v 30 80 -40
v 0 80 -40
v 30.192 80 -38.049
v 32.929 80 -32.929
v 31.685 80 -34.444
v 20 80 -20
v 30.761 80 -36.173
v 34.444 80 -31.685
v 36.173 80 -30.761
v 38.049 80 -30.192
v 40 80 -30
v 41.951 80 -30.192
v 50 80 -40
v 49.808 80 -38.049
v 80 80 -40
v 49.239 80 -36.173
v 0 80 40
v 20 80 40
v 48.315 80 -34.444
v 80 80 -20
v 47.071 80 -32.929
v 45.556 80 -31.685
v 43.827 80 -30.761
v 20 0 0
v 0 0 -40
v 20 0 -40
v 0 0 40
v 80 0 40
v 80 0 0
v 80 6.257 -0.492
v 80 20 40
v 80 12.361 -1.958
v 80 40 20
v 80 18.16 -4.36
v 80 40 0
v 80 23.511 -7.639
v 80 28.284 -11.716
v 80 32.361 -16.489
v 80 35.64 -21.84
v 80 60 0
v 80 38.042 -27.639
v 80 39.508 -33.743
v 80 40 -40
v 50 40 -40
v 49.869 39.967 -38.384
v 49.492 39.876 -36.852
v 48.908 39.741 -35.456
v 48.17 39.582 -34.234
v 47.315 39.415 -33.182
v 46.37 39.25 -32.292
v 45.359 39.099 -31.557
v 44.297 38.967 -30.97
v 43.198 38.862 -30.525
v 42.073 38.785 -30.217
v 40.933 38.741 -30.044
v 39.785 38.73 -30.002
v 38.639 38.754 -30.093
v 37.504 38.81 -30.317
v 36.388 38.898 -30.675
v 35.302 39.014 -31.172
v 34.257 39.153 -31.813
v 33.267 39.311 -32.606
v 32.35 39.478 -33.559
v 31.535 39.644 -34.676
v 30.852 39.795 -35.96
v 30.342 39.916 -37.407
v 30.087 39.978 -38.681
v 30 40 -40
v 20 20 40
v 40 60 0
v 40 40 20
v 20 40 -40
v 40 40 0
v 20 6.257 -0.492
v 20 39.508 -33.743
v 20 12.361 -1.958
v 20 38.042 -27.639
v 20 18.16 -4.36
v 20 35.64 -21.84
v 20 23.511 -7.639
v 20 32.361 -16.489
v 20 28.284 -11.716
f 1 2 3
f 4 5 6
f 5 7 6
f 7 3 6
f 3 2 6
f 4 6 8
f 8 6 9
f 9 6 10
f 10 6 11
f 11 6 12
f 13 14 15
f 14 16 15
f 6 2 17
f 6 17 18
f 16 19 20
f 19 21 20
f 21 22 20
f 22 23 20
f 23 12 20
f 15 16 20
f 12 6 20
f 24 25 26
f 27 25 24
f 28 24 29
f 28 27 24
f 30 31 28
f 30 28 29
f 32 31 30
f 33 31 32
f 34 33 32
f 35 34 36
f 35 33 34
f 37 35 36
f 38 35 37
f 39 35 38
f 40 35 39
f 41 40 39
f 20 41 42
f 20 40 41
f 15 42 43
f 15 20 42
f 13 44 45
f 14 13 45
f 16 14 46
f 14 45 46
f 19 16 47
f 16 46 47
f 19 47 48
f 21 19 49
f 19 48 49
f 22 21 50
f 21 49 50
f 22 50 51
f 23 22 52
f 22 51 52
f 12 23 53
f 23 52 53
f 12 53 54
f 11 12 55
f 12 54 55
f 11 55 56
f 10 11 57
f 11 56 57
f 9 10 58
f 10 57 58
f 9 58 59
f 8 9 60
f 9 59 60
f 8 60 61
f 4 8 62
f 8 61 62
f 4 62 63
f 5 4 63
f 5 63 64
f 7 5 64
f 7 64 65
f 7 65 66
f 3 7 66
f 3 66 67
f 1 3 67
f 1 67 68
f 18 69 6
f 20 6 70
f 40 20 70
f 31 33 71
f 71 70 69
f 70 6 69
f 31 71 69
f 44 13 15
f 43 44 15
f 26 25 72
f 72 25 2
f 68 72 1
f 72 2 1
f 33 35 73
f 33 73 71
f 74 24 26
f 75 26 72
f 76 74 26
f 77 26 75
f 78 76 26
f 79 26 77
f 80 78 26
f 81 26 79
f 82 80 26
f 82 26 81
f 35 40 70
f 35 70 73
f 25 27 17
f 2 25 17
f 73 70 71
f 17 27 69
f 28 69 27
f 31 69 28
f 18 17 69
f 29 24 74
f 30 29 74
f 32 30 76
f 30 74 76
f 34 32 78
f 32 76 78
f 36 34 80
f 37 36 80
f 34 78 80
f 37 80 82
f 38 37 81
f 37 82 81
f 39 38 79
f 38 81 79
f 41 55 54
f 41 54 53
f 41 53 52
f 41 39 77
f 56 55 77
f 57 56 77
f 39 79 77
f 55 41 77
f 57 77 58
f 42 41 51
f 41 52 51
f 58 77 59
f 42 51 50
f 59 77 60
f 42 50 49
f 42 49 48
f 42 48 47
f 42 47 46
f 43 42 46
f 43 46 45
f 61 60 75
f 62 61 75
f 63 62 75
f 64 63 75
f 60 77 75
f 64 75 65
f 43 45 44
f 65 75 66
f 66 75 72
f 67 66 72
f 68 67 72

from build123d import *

# Parameters (mm, degrees)
SKETCH1_W           = 20
SKETCH1_H           = 80
BOSS_EXTRUDE1_DEPTH = 40
BOSS_EXTRUDE2_DEPTH = 80
CUT_EXTRUDE2_DEPTH  = 40
CUT_EXTRUDE4_DEPTH  = 81


with BuildPart() as part:
    # Sketch1 → Boss-Extrude1 (new body, symmetric)
    with BuildSketch(Plane.XY):
        with Locations((10, 40)):
            Rectangle(SKETCH1_W, SKETCH1_H)
    extrude(amount=BOSS_EXTRUDE1_DEPTH, both=True)

    # Sketch2 → Boss-Extrude2 (add)
    with BuildSketch(Plane(origin=(0, 0, 0), x_dir=(0, 0, -1), z_dir=(1, 0, 0))):
        with BuildLine():
            Line((40, 80), (20, 80))
            Line((20, 80), (-40, 20))
            Line((-40, 20), (-40, 0))
            Line((-40, 0), (0, 0))
            ThreePointArc((0, 0), (11.715728753, 28.284271247), (40, 40))
            Line((40, 40), (40, 80))
        make_face()
    extrude(amount=BOSS_EXTRUDE2_DEPTH)

    # Sketch4 → Cut-Extrude2 (cut)
    with BuildSketch(Plane(origin=(80, 0, 0), x_dir=(0, 0, -1), z_dir=(1, 0, 0))):
        Polygon((0, 60), (0, 40), (-20, 40), align=None)
    extrude(amount=-CUT_EXTRUDE2_DEPTH, mode=Mode.SUBTRACT)

    # Sketch5 → Cut-Extrude4 (cut, through all)
    with BuildSketch(Plane(origin=(0, 0, 0), x_dir=(1, 0, 0), z_dir=(0, 1, 0))):
        with BuildLine():
            Line((40, 40), (50, 40))
            ThreePointArc((50, 40), (40, 30), (30, 40))
            Line((30, 40), (40, 40))
        make_face()
    extrude(amount=CUT_EXTRUDE4_DEPTH, mode=Mode.SUBTRACT)


solid = part.part
